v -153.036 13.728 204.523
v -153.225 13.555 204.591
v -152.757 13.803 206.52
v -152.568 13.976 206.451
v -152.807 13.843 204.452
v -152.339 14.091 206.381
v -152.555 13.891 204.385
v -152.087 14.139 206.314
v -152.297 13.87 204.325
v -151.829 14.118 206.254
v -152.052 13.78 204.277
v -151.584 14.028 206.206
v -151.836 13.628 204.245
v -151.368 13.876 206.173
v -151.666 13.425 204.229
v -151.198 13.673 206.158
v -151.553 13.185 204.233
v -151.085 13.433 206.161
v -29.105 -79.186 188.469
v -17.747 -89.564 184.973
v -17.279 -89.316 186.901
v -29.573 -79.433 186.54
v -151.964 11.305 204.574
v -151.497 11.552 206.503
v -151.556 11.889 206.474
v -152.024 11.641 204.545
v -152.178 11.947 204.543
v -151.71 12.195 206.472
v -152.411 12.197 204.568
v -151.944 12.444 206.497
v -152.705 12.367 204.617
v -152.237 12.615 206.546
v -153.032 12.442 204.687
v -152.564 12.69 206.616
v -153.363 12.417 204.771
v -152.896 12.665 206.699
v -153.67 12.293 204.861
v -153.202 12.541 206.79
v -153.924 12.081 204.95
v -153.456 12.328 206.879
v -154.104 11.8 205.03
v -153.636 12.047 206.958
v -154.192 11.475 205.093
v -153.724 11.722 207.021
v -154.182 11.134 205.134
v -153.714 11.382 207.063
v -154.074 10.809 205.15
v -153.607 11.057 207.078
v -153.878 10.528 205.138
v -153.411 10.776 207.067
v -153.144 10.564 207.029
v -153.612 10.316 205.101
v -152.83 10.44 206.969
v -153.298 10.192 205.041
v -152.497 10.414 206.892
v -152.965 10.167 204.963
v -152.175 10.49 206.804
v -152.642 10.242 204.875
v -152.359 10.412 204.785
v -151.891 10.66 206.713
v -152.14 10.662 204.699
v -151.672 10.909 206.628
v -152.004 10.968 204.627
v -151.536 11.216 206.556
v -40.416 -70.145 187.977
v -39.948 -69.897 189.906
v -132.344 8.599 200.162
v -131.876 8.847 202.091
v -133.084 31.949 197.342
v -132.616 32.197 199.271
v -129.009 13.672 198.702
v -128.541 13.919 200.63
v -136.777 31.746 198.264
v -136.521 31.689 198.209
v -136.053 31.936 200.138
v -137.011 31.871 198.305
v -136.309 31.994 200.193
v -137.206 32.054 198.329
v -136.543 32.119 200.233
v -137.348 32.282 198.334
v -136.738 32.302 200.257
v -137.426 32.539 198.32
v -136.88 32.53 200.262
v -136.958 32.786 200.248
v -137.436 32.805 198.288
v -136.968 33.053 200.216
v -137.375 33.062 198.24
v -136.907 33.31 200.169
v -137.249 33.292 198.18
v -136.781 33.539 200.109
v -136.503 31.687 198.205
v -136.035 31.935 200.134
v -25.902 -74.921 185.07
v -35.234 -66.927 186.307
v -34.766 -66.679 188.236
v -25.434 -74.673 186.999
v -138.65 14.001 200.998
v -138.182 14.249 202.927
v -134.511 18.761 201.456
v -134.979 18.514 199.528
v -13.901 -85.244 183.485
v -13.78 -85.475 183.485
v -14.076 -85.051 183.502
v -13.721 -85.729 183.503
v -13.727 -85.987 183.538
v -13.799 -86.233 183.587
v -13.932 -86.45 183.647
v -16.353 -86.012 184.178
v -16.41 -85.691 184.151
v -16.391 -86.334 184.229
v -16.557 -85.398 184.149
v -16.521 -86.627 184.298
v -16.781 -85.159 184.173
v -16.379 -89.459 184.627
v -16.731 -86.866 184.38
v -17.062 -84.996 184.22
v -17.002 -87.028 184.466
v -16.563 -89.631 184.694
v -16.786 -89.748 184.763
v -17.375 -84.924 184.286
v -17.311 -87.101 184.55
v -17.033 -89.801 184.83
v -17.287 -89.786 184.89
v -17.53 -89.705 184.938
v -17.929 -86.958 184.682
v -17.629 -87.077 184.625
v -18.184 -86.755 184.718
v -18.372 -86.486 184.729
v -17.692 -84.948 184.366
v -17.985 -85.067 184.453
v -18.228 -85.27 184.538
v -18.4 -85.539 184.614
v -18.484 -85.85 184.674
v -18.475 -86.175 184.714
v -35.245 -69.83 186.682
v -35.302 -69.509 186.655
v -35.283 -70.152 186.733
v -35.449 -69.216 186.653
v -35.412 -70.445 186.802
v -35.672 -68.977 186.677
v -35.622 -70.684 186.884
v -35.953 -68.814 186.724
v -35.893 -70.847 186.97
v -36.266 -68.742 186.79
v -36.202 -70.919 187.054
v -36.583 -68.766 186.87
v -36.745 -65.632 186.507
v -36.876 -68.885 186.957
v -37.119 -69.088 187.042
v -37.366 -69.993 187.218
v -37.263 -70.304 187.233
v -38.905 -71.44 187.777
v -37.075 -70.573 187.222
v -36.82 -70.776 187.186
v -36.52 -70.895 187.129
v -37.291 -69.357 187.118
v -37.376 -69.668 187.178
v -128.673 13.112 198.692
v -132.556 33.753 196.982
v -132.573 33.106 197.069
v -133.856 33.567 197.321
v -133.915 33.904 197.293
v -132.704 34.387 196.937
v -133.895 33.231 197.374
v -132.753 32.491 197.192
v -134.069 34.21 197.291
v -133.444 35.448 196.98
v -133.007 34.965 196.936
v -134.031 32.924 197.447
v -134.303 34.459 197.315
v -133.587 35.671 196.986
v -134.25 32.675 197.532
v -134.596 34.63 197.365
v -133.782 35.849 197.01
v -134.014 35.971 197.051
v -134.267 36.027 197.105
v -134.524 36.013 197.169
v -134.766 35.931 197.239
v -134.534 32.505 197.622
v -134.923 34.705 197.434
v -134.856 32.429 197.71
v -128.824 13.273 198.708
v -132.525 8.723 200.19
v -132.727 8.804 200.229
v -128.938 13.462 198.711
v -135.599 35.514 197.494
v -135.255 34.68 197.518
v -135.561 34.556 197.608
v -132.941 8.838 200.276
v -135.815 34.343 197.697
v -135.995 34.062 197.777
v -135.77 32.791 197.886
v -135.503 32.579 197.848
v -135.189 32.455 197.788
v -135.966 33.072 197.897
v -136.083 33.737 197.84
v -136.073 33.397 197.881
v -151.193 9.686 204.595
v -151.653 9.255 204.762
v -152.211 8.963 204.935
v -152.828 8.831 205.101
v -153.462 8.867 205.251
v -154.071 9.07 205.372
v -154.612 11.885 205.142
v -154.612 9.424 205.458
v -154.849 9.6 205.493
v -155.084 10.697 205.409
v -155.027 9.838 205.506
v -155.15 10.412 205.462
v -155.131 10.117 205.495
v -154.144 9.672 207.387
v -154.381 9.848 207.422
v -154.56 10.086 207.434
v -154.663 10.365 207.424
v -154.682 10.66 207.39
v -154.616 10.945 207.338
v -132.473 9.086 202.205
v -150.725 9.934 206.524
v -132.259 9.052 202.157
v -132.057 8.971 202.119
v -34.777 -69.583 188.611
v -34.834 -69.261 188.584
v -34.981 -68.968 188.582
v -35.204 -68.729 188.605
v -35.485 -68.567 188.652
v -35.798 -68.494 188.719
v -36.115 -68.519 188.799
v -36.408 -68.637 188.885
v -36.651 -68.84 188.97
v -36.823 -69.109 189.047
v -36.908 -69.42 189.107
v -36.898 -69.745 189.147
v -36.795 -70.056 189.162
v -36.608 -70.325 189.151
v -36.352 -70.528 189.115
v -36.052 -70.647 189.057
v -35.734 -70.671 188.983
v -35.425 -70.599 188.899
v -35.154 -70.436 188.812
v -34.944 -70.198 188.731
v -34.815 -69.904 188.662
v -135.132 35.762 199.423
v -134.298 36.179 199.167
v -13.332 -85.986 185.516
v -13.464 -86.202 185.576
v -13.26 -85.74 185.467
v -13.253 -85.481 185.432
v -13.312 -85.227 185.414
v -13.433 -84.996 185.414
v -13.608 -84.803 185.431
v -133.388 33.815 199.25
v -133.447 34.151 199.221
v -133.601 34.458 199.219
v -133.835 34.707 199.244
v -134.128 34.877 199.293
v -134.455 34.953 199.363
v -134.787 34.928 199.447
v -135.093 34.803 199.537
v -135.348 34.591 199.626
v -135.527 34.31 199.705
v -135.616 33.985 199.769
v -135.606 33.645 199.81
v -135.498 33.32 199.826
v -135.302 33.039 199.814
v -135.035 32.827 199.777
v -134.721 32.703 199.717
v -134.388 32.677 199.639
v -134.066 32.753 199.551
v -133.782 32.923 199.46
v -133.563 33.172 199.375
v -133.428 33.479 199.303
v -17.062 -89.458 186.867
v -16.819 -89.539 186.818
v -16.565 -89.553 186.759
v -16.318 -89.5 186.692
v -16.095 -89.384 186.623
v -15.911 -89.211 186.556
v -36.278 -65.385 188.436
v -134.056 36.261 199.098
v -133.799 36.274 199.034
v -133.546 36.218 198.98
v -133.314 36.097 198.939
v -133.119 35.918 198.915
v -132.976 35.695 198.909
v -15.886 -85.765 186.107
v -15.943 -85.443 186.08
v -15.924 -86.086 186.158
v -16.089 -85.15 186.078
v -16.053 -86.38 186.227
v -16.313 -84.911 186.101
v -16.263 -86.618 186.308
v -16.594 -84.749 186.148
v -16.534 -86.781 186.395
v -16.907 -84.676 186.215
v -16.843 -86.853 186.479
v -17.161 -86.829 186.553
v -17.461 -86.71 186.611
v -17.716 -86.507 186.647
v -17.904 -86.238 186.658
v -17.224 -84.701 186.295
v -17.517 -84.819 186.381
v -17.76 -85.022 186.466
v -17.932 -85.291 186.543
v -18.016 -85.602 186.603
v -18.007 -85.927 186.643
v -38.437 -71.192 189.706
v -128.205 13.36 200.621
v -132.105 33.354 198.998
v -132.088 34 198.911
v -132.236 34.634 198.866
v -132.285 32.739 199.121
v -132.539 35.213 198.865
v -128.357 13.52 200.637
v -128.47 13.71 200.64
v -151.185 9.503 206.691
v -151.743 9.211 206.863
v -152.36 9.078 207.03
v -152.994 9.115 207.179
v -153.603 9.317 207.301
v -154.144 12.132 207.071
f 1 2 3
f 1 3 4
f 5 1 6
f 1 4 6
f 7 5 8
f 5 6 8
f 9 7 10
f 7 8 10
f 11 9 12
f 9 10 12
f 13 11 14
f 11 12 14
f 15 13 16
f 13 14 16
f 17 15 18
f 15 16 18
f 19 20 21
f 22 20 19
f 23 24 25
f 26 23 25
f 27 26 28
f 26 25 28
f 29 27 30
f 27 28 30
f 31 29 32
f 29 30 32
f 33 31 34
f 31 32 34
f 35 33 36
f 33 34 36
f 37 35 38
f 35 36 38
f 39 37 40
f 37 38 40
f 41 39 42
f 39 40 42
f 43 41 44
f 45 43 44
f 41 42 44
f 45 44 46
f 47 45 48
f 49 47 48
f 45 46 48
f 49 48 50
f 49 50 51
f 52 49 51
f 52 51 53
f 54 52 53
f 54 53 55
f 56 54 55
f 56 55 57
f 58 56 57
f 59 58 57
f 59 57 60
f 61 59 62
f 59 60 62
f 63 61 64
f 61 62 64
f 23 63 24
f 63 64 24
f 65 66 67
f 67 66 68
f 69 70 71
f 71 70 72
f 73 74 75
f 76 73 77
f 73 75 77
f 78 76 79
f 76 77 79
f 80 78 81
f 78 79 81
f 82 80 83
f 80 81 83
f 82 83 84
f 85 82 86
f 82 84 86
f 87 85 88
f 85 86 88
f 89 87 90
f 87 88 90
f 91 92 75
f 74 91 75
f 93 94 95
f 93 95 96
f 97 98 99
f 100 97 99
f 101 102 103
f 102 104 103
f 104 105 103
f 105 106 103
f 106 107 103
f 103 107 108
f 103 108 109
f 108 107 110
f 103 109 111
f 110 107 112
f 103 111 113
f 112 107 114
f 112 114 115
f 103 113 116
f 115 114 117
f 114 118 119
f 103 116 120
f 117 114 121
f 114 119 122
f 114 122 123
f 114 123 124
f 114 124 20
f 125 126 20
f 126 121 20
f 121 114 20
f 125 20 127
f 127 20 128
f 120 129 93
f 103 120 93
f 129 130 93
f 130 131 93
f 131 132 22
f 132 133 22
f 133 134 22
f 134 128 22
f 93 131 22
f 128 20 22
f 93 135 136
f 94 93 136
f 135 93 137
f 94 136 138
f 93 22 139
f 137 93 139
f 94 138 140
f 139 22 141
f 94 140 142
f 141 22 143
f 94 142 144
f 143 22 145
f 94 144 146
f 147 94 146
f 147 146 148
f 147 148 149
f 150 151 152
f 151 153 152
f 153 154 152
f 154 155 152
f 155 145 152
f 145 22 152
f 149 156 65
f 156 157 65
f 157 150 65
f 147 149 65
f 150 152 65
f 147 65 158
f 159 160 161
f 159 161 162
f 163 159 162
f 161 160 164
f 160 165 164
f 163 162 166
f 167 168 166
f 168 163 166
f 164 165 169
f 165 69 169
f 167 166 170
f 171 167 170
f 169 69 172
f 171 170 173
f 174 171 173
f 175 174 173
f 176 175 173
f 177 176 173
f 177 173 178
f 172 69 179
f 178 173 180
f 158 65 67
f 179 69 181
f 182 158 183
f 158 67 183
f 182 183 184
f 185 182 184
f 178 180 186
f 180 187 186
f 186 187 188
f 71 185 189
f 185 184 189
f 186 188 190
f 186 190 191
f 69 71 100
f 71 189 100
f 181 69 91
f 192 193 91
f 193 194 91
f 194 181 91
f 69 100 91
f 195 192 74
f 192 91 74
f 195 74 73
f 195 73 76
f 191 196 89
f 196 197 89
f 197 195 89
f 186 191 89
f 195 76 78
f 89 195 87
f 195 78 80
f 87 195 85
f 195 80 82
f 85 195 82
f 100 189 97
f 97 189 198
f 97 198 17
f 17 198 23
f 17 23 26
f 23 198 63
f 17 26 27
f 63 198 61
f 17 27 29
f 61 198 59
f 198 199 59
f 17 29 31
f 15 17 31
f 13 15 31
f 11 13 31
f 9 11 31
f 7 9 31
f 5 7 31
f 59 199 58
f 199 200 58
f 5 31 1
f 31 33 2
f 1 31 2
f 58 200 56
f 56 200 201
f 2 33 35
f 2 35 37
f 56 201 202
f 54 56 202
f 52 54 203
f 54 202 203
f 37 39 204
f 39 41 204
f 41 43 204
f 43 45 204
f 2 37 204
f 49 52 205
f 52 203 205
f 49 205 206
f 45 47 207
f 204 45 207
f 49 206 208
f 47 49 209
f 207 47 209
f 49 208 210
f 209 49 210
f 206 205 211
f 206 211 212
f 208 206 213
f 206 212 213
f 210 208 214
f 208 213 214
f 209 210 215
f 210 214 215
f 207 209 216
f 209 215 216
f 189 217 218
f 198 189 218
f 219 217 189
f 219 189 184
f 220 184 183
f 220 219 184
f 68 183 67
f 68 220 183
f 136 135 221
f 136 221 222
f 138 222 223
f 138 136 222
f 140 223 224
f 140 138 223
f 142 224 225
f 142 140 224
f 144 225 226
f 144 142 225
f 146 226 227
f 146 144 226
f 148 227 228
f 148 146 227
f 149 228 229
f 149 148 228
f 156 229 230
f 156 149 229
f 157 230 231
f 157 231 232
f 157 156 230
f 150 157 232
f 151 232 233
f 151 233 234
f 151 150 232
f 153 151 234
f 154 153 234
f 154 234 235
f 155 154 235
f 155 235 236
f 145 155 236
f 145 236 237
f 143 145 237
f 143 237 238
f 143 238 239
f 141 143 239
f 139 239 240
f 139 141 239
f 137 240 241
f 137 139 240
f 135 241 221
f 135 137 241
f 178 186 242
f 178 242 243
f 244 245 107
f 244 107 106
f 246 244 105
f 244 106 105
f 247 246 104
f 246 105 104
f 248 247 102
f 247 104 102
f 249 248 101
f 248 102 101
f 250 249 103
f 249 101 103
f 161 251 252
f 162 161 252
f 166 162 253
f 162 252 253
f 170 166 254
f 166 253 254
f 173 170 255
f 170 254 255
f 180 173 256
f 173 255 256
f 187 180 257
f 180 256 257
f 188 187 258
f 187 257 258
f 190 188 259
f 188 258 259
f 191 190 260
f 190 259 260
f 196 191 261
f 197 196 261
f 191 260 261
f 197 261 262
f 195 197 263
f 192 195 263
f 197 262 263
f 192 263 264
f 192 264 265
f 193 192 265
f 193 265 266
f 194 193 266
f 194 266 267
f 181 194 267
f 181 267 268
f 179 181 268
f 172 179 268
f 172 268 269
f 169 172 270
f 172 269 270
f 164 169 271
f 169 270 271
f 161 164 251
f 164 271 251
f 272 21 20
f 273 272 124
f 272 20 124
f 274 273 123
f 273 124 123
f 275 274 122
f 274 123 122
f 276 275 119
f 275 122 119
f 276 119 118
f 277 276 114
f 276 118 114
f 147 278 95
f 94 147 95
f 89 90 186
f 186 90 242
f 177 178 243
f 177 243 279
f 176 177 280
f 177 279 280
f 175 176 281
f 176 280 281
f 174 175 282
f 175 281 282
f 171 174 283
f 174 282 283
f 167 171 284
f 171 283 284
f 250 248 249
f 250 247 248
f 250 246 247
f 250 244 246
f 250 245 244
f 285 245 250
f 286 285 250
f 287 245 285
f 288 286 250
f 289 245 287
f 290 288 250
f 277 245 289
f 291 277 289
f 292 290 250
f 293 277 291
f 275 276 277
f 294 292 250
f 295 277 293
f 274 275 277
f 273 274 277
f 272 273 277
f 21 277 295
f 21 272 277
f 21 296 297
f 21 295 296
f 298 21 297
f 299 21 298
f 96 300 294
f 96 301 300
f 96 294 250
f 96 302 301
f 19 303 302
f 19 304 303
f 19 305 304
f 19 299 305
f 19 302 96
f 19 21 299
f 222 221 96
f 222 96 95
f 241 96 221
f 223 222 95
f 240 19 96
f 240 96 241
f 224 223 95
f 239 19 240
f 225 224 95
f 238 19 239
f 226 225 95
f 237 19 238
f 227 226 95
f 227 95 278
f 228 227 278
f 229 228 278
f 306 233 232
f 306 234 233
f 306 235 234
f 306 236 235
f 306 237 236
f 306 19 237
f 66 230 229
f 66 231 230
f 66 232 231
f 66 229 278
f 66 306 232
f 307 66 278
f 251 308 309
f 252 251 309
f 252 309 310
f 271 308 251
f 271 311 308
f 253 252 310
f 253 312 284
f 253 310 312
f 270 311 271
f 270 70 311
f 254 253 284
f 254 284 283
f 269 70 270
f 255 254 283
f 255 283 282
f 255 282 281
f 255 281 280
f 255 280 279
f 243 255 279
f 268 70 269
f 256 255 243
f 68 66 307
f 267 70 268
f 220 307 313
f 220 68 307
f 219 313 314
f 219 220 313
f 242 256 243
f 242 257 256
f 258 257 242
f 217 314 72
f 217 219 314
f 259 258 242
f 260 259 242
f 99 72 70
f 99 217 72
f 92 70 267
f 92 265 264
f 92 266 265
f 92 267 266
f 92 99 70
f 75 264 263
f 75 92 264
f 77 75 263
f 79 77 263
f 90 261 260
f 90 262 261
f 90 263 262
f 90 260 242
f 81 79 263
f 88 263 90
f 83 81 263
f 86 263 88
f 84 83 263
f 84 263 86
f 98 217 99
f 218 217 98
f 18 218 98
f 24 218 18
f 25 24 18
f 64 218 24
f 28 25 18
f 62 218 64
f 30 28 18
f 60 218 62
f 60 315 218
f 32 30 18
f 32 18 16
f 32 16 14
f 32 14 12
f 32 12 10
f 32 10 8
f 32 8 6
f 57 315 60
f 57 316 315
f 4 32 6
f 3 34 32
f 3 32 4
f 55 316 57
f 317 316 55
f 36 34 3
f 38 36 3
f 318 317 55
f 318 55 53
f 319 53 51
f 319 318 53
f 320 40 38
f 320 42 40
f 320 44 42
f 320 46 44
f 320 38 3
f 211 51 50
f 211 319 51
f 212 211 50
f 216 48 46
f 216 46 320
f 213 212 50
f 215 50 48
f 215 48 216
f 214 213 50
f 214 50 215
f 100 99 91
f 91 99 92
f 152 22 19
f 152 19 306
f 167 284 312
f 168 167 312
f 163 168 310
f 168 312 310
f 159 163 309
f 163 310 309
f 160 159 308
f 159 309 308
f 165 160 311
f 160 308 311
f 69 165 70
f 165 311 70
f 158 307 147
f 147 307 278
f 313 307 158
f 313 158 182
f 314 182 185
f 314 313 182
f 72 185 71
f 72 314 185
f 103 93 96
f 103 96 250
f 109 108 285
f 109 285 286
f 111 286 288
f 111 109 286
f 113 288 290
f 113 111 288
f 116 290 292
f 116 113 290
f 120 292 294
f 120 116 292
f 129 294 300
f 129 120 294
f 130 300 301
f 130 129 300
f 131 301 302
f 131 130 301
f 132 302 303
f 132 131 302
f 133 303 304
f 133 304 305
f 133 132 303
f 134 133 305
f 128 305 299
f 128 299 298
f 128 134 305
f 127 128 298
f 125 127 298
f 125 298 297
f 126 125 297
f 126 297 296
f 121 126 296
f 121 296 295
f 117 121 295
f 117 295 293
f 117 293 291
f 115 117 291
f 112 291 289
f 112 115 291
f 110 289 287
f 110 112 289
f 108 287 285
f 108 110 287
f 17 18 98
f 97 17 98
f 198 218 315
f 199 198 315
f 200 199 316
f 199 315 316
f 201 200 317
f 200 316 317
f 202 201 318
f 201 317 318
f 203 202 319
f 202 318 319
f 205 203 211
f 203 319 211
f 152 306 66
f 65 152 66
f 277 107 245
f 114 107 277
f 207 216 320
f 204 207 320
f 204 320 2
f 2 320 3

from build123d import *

# Parameters (mm, degrees)
SZKIC3_R                    = 1.10000034
DODANIE_WYCI_GNI_CIE2_DEPTH = 2
SZKIC7_R                    = 1.15000024
DODANIE_WYCI_GNI_CIE4_DEPTH = 2
ZAOKR_GLENIE1_R             = 1


with BuildPart() as part:
    # Szkic3 → Dodanie-wyciągnięcie2 (new body)
    with BuildSketch(Plane(origin=(38.160641903, 20.207828477, 157.30929901), x_dir=(0.972253346903095, -0.029805597670841302, -0.23202382589556209), z_dir=(0.23393039442477367, 0.12387698555880203, 0.964329333274237))):
        Polygon((-69.666310572, -102.553561212), (-79.264860968, -94.782442078), (-80.819178513, -93.5240451), (-77.043735552, -88.860781173), (-75.489418007, -90.119178151), (-65.890867611, -97.890297285), (-52.950125678, -108.367300905), (-56.725568639, -113.030564831), align=None)
        with Locations(Location((-57.169345947, -108.811046896, 0), (0, 0, 1.721249632))):
            Circle(SZKIC3_R, mode=Mode.SUBTRACT)
        with Locations(Location((-76.599691895, -93.079970126, 0), (0, 0, 1.721249632))):
            Circle(SZKIC3_R, mode=Mode.SUBTRACT)
    extrude(amount=DODANIE_WYCI_GNI_CIE2_DEPTH)

    # Szkic7 → Dodanie-wyciągnięcie4 (add)
    with BuildSketch(Plane(origin=(38.628502692, 20.455582448, 159.237957676), x_dir=(0.9722533469030947, -0.029805597670841396, -0.23202382589556286), z_dir=(0.23393039442477445, 0.12387698555880199, 0.9643293332742368))):
        with BuildLine():
            Line((-80.819178513, -93.5240451), (-175.638878356, -16.756704897))
            Line((-175.638878356, -16.756704897), (-194.757445315, -16.460528815))
            ThreePointArc((-194.757445315, -16.460528815), (-196.438982344, -17.373715152), (-198.273708049, -16.830338985))
            Line((-198.273708049, -16.830338985), (-199.491256389, -17.388602921))
            Line((-199.491256389, -17.388602921), (-198.273726955, -14.349785721))
            Line((-198.273726955, -14.349785721), (-195.616721108, -11.132918291))
            Line((-195.616721108, -11.132918291), (-195.127524487, -12.944294382))
            Line((-195.127524487, -12.944294382), (-181.856563591, -11.72278095))
            Line((-181.856563591, -11.72278095), (-178.08112063, -7.059517023))
            Line((-178.08112063, -7.059517023), (-179.648209308, 6.175086532))
            Line((-179.648209308, 6.175086532), (-181.521733094, 6.276601555))
            Line((-181.521733094, 6.276601555), (-178.718962553, 10.061139804))
            Line((-178.718962553, 10.061139804), (-176.20935813, 11.368191294))
            Line((-176.20935813, 11.368191294), (-176.502006841, 10.061139804))
            ThreePointArc((-176.502006841, 10.061139804), (-175.588684843, 8.379653584), (-176.131934764, 6.544869536))
            Line((-176.131934764, 6.544869536), (-171.863435395, -12.093440971))
            Line((-171.863435395, -12.093440971), (-77.043735552, -88.860781173))
            Line((-77.043735552, -88.860781173), (-80.819178513, -93.5240451))
        make_face()
        with Locations(Location((-178.074960694, 8.117983918, 0), (0, 0, 1.721249632))):
            Circle(SZKIC7_R, mode=Mode.SUBTRACT)
        with Locations(Location((-196.700467622, -14.887437029, 0), (0, 0, 1.721249632))):
            Circle(SZKIC7_R, mode=Mode.SUBTRACT)
    extrude(amount=-DODANIE_WYCI_GNI_CIE4_DEPTH)

    # Zaokrąglenie1
    # the kernel refuses this fillet: 1 mm, written as the material it adds along each edge
    with BuildSketch(Plane(origin=(-132.136984635, 9.070469004, 202.125371666), x_dir=(0.7556456600365923, -0.6472773151749931, -0.10015844311747091), z_dir=(-0.23393039442477445, -0.12387698555880199, -0.9643293332742368))) as zaokr_glenie1_piece_1:
        with BuildLine():
            CenterArc((ZAOKR_GLENIE1_R * 0.345368312497, ZAOKR_GLENIE1_R), ZAOKR_GLENIE1_R, 231.893419256, 38.106580745)
            Line((-ZAOKR_GLENIE1_R * 0.271757942514, ZAOKR_GLENIE1_R * 0.213135853291), (0, 0))
            Line((0, 0), (ZAOKR_GLENIE1_R * 0.345368312498, 0))
        make_face()
    extrude(amount=2)
    with BuildSketch(Plane(origin=(-128.466297581, 13.583197282, 200.655222001), x_dir=(0.755645659983129, -0.6472773152407205, -0.10015844309605833), z_dir=(-0.23393039442477445, -0.12387698555880199, -0.9643293332742368))) as zaokr_glenie1_piece_2:
        with BuildLine():
            CenterArc((ZAOKR_GLENIE1_R * 0.345368517806, -ZAOKR_GLENIE1_R), ZAOKR_GLENIE1_R, 89.999999995, 38.106601769)
            Line((-ZAOKR_GLENIE1_R * 0.271758025873, -ZAOKR_GLENIE1_R * 0.213136079689), (0, 0))
            Line((0, 0), (ZAOKR_GLENIE1_R * 0.345368517893, 0))
        make_face()
    extrude(amount=2)
    # the kernel refuses this fillet: 1 mm, written as the material it takes off along each edge
    with BuildSketch(Plane(origin=(-150.430265808, 15.842388646, 210.703360527), x_dir=(-0.6191538304813691, -0.7457448210428924, 0.24599430092575822), z_dir=(-0.23393039442477445, -0.12387698555880199, -0.9643293332742368))) as zaokr_glenie1_2_piece_1:
        with BuildLine():
            CenterArc((1.932614717, -1), ZAOKR_GLENIE1_R, 90, 122.052914314)
            Line((1.085056378, -1.530702235), (0, 0))
            Line((0, 0), (1.932614717, 0))
        make_face()
    extrude(amount=11.663073583, mode=Mode.SUBTRACT)
    with BuildSketch(Plane(origin=(-154.176575818, 9.764143782, 212.484809281), x_dir=(0.8837805609022797, 0.3863007559342876, -0.2640144809207439), z_dir=(-0.23393039442477445, -0.12387698555880199, -0.9643293332742368))) as zaokr_glenie1_2_piece_2:
        with BuildLine():
            CenterArc((2.115550514, -0.630589135), ZAOKR_GLENIE1_R, 140.906398732, 85.559709417)
            Line((1.426766982, -1.355556201), (0, 0))
            Line((0, 0), (1.339433679, 0))
        make_face()
    extrude(amount=11.840219302, mode=Mode.SUBTRACT)
    with BuildSketch(Plane(origin=(-136.76997961, 32.666813554, 205.035015593), x_dir=(0.9708292594479915, -0.08342561993848581, -0.22479037999332602), z_dir=(-0.23393039442477445, -0.12387698555880199, -0.9643293332742368))) as zaokr_glenie1_2_piece_3:
        with BuildLine():
            CenterArc((ZAOKR_GLENIE1_R * 1.85804027171, -ZAOKR_GLENIE1_R), ZAOKR_GLENIE1_R, 90, 123.421594356)
            Line((ZAOKR_GLENIE1_R * 1.02339993985, -ZAOKR_GLENIE1_R * 1.55079534897), (0, 0))
            Line((0, 0), (ZAOKR_GLENIE1_R * 1.85804027171, 0))
        make_face()
    extrude(amount=11.290201359, mode=Mode.SUBTRACT)
    with BuildSketch(Plane(origin=(-131.602089653, 37.560111501, 203.16570616), x_dir=(-0.8623099936693889, -0.4317250154405725, 0.26464123990930793), z_dir=(-0.23393039442477445, -0.12387698555880199, -0.9643293332742368))) as zaokr_glenie1_2_piece_4:
        with BuildLine():
            CenterArc((1.863025718, -1), ZAOKR_GLENIE1_R, 90, 91.379076601)
            Line((0.863315373, -1.024067103), (0, 0))
            Line((0, 0), (1.863025718, 0))
        make_face()
    extrude(amount=11.315128591, mode=Mode.SUBTRACT)
    with BuildSketch(Plane(origin=(-13.905120992, -86.007744656, 180.991487948), x_dir=(-0.6117811757755813, -0.7521213796372446, 0.24502494415715118), z_dir=(0.23393039442477367, 0.12387698555880203, 0.964329333274237)), Plane(origin=(-17.575808047, -90.520472934, 182.461637613), x_dir=(-0.7556456600354768, 0.6472773151763643, 0.10015844311702354), z_dir=(0.23393039442477367, 0.12387698555880203, 0.964329333274237))) as zaokr_glenie1_2_piece_5:
        with BuildLine():
            CenterArc((ZAOKR_GLENIE1_R, -ZAOKR_GLENIE1_R), ZAOKR_GLENIE1_R, 90, 90)
            Line((0, -ZAOKR_GLENIE1_R), (0, 0))
            Line((0, 0), (ZAOKR_GLENIE1_R, 0))
        make_face()
    extrude(amount=7, mode=Mode.SUBTRACT)


solid = part.part
